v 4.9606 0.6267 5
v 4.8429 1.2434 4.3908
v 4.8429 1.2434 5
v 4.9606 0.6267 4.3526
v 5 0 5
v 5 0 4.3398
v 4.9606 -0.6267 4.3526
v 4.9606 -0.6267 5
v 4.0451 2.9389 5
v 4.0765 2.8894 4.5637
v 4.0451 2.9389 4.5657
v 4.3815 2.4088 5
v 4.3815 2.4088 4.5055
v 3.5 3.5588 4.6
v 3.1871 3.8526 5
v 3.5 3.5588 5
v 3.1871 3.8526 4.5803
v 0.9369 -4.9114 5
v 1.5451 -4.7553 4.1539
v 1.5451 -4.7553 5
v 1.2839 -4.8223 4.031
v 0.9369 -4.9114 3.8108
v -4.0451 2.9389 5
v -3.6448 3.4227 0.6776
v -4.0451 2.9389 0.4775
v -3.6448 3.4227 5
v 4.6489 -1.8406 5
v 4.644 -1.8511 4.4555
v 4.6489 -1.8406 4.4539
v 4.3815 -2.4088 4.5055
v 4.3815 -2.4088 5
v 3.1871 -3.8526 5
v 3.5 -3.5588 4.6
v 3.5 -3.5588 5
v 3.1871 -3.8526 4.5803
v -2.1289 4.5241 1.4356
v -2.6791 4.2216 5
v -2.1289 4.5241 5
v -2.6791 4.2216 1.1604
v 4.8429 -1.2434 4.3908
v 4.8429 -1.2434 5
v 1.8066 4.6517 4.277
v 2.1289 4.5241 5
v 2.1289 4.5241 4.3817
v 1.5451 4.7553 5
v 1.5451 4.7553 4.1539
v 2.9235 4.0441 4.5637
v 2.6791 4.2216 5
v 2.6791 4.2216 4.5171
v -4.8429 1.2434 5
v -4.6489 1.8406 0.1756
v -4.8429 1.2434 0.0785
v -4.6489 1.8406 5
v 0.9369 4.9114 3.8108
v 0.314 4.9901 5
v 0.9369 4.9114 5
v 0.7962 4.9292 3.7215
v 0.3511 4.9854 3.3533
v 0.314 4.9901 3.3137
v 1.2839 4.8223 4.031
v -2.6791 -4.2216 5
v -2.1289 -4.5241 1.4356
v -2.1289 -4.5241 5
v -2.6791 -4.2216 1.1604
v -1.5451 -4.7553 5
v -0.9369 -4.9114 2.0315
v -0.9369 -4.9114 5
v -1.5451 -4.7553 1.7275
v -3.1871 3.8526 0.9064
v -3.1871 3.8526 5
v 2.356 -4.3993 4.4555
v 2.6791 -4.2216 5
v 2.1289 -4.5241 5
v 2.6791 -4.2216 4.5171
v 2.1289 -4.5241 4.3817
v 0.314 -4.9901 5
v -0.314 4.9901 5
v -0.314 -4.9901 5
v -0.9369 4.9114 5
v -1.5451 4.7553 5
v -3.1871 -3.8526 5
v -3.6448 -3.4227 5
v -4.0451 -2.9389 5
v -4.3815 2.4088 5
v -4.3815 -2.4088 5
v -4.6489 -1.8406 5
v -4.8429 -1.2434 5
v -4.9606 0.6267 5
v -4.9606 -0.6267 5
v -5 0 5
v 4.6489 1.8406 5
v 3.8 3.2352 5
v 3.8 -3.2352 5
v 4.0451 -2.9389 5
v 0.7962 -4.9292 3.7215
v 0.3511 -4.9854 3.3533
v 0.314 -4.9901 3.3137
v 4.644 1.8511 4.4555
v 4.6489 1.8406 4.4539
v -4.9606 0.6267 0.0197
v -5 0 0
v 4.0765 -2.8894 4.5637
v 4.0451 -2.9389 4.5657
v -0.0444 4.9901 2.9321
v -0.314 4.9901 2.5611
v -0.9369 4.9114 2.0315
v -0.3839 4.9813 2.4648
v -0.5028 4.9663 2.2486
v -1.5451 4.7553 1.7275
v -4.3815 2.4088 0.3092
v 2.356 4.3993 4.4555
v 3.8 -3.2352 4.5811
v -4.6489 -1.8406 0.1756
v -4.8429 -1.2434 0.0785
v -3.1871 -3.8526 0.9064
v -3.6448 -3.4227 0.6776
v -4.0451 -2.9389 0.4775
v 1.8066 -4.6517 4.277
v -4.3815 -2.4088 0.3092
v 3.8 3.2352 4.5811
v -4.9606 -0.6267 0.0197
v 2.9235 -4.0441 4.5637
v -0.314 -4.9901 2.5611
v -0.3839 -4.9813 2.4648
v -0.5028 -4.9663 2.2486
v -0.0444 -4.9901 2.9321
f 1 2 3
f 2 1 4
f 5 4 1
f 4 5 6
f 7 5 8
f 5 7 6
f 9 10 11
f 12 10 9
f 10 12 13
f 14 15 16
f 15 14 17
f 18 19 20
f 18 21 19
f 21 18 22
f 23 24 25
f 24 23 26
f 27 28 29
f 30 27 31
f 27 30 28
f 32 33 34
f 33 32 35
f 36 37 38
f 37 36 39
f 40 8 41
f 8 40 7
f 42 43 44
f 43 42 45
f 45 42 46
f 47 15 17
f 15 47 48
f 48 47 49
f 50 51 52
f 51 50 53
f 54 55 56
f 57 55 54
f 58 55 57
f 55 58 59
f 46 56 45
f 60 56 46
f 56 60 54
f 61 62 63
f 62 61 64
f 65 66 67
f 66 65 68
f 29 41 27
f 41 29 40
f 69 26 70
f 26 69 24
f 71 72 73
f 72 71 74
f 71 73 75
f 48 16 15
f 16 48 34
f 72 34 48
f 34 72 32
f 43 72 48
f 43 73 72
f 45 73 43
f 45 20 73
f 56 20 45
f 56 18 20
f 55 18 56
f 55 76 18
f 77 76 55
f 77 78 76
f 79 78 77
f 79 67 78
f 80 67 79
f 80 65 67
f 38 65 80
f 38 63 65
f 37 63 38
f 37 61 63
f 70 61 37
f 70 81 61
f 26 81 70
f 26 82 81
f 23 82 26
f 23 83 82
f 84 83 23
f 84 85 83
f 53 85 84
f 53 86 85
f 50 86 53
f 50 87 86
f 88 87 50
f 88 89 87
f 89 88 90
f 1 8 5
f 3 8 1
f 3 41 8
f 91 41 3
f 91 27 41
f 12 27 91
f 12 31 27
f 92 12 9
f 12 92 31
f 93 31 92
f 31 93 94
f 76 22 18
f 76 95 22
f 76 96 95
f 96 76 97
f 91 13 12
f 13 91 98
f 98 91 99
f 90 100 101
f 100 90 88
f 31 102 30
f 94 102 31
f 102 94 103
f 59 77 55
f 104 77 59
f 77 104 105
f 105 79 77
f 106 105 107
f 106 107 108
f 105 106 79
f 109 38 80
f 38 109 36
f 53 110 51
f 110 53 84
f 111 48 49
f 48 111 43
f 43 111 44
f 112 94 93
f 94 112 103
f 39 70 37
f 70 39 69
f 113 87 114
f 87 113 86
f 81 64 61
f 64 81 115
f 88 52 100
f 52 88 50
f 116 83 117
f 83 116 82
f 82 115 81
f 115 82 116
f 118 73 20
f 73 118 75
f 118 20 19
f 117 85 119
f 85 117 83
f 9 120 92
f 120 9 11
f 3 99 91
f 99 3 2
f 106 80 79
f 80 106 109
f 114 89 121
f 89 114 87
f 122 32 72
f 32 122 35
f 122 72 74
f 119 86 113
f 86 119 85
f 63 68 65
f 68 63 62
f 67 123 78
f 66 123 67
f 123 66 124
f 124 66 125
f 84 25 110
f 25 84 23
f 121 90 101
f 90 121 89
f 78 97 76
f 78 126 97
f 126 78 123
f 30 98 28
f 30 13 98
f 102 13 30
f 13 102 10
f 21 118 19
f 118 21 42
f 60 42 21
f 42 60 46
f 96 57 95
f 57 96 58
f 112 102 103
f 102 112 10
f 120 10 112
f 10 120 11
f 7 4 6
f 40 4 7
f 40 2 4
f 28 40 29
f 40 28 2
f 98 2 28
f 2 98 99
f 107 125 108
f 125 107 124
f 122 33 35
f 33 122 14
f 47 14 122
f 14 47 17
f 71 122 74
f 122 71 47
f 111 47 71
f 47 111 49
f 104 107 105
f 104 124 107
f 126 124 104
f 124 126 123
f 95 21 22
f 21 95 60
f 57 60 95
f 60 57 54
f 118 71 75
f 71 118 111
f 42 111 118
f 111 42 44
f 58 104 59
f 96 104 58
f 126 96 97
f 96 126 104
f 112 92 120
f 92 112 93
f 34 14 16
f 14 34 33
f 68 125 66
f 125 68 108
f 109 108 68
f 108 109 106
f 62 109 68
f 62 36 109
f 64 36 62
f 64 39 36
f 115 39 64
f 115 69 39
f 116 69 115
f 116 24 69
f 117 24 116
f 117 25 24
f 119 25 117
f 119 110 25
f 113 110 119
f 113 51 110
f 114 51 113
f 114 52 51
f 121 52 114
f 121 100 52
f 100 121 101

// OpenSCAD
//Prism module
 module prism(l, w, h){
       polyhedron(
               points=[[0,0,0], [l,0,0], [l,w,0], [0,w,0], [0,w,h], [l,w,h]],
               faces=[[0,1,2,3],[5,4,3,2],[0,4,5,1],[0,3,4],[5,2,1]]
               );
       }





SU =5 ;
windsheet_displacement = 3.5 ;
WST = 0.3 ;
Wall_thickness = 0.4 ;
languid_thickness = Wall_thickness ; 


//



translate([0,0,0]){//this was added
    difference(){
        difference(){   
            difference(){
                
                
                
                
                translate ([0,0,0]){
                    cylinder (h=SU,r1=SU,r2=SU,center=false,$fn=50);
                }
                
                
                
                
                rotate ([270,270,0]){
                    translate ([0,windsheet_displacement,0])
                        cylinder (h=2*SU,r1=SU-languid_thickness,r2=SU-languid_thickness,center=true,$fn=50);
                }
            }
            
            translate ([windsheet_displacement,-SU,0])
                cube ([WST,2*SU,SU]);
        }
        rotate([270,0,90]){
            translate([-SU,-SU/2,0])
                prism(SU*2,SU/2,SU);
        }
    }
}
